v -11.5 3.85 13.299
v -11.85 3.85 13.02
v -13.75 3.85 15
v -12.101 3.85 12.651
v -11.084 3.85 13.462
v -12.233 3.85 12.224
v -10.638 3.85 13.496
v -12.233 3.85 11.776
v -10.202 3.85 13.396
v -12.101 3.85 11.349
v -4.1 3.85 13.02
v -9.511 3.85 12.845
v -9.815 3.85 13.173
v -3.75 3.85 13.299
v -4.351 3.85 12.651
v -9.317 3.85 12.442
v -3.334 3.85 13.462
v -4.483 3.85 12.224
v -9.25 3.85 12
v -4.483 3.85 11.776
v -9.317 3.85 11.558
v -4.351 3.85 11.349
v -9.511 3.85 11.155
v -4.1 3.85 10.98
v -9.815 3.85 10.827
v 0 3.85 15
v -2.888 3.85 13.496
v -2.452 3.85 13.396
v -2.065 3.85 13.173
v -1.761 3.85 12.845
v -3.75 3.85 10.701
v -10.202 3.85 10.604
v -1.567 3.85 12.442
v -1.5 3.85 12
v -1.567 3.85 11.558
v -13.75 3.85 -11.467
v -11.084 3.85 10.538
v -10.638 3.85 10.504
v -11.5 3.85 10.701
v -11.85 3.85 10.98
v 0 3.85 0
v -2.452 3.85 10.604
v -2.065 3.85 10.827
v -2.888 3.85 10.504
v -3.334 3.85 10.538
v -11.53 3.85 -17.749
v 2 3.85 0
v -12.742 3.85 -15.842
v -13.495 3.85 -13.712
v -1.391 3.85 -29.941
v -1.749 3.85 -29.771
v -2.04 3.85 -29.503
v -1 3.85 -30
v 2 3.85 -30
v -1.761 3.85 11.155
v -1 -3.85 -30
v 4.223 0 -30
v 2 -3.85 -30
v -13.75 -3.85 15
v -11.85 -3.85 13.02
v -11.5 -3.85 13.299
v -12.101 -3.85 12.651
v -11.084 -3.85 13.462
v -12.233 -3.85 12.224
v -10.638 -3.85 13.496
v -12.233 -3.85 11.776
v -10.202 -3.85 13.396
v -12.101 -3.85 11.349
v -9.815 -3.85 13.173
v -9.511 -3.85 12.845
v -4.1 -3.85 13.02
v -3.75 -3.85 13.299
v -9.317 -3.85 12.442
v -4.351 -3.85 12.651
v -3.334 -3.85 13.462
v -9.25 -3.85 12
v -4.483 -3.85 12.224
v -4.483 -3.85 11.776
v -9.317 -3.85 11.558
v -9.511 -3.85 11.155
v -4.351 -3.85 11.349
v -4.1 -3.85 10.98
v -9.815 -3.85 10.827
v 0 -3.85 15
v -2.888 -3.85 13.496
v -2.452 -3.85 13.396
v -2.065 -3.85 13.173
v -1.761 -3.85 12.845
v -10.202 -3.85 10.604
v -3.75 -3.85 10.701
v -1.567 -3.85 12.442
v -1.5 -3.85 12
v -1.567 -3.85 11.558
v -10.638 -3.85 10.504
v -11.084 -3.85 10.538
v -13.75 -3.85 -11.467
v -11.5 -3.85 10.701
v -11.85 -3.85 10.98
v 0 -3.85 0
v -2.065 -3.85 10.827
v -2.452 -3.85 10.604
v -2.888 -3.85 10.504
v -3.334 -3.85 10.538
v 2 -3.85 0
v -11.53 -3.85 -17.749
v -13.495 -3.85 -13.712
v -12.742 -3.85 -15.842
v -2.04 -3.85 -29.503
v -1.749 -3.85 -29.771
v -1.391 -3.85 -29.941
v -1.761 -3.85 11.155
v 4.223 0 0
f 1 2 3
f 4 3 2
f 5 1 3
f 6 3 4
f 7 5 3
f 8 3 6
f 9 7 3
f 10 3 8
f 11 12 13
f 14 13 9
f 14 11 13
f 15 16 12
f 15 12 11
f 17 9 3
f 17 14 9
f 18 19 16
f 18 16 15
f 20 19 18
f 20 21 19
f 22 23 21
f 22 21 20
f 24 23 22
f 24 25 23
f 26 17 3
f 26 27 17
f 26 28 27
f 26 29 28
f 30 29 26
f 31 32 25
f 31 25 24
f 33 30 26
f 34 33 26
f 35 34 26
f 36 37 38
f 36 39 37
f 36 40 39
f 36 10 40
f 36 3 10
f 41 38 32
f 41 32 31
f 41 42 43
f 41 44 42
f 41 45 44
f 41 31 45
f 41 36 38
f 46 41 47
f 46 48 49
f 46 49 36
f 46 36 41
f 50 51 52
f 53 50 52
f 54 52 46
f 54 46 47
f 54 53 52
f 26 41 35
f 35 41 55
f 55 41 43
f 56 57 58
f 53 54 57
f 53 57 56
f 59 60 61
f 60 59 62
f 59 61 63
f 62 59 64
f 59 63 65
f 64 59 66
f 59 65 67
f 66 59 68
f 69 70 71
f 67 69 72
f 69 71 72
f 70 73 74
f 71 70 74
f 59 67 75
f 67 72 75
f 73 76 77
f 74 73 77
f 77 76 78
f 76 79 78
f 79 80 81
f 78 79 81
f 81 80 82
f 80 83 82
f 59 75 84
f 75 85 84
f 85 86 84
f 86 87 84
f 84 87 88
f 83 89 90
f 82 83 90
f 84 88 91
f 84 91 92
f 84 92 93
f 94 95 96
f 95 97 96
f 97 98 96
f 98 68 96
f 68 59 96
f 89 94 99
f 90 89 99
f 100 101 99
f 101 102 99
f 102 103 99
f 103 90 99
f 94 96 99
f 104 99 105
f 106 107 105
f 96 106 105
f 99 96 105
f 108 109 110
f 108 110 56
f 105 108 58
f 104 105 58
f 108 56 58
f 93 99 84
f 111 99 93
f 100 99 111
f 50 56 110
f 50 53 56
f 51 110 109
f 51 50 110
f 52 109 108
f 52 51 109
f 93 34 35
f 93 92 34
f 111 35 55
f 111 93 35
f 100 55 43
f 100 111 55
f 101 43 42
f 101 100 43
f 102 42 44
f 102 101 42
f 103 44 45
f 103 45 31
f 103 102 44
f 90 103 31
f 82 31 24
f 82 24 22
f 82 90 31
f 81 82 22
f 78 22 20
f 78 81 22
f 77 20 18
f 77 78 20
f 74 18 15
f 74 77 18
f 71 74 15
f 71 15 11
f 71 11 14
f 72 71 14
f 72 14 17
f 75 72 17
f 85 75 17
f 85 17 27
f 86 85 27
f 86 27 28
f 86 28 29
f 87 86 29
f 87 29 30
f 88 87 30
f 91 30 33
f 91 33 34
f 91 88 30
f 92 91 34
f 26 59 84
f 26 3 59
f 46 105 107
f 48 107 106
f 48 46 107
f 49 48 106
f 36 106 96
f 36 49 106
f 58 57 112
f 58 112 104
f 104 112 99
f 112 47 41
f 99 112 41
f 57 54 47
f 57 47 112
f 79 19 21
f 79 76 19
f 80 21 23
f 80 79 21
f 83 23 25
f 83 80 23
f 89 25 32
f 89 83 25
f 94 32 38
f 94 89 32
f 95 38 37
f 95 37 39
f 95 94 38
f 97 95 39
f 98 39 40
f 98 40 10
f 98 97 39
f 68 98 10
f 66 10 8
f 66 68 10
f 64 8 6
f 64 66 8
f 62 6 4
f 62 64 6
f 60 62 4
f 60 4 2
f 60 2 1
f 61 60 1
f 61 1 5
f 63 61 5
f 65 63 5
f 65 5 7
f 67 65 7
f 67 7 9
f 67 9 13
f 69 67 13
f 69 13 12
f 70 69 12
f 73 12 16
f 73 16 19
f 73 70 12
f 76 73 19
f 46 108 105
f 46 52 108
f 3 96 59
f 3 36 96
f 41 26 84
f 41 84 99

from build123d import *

# Parameters (mm, degrees)
SKETCH1_R           = 1.5
BOSS_EXTRUDE3_DEPTH = 3.85
BOSS_EXTRUDE4_DEPTH = 30


with BuildPart() as part:
    # Sketch1 → Boss-Extrude3 (new body, symmetric)
    with BuildSketch(Plane(origin=(0, 0, 0), x_dir=(1, 0, 0), z_dir=(0, 1, 0))):
        with BuildLine():
            Line((-13.75, -15), (0, -15))
            Line((0, -15), (0, 0))
            Line((0, 0), (2, 0))
            Line((2, 0), (2, 30))
            Line((2, 30), (-1, 30))
            ThreePointArc((-1, 30), (-1.576352013, 29.869367868), (-2.040057994, 29.503003078))
            Line((-2.040057994, 29.503003078), (-11.530466398, 17.748937838))
            ThreePointArc((-11.530466398, 17.748937838), (-13.178803317, 14.798188939), (-13.75, 11.466872681))
            Line((-13.75, 11.466872681), (-13.75, -15))
        make_face()
        with Locations((-10.75, -12)):
            Circle(SKETCH1_R, mode=Mode.SUBTRACT)
        with Locations((-3, -12)):
            Circle(SKETCH1_R, mode=Mode.SUBTRACT)
    extrude(amount=BOSS_EXTRUDE3_DEPTH, both=True)

    # Sketch2 → Boss-Extrude4 (add)
    with BuildSketch(Plane(origin=(0, 0, -30), x_dir=(-1, 0, 0), z_dir=(0, 0, -1))):
        Polygon((-2, 3.85), (-4.222798536, 0), (-2, -3.85), align=None)
    extrude(amount=-BOSS_EXTRUDE4_DEPTH)


solid = part.part
